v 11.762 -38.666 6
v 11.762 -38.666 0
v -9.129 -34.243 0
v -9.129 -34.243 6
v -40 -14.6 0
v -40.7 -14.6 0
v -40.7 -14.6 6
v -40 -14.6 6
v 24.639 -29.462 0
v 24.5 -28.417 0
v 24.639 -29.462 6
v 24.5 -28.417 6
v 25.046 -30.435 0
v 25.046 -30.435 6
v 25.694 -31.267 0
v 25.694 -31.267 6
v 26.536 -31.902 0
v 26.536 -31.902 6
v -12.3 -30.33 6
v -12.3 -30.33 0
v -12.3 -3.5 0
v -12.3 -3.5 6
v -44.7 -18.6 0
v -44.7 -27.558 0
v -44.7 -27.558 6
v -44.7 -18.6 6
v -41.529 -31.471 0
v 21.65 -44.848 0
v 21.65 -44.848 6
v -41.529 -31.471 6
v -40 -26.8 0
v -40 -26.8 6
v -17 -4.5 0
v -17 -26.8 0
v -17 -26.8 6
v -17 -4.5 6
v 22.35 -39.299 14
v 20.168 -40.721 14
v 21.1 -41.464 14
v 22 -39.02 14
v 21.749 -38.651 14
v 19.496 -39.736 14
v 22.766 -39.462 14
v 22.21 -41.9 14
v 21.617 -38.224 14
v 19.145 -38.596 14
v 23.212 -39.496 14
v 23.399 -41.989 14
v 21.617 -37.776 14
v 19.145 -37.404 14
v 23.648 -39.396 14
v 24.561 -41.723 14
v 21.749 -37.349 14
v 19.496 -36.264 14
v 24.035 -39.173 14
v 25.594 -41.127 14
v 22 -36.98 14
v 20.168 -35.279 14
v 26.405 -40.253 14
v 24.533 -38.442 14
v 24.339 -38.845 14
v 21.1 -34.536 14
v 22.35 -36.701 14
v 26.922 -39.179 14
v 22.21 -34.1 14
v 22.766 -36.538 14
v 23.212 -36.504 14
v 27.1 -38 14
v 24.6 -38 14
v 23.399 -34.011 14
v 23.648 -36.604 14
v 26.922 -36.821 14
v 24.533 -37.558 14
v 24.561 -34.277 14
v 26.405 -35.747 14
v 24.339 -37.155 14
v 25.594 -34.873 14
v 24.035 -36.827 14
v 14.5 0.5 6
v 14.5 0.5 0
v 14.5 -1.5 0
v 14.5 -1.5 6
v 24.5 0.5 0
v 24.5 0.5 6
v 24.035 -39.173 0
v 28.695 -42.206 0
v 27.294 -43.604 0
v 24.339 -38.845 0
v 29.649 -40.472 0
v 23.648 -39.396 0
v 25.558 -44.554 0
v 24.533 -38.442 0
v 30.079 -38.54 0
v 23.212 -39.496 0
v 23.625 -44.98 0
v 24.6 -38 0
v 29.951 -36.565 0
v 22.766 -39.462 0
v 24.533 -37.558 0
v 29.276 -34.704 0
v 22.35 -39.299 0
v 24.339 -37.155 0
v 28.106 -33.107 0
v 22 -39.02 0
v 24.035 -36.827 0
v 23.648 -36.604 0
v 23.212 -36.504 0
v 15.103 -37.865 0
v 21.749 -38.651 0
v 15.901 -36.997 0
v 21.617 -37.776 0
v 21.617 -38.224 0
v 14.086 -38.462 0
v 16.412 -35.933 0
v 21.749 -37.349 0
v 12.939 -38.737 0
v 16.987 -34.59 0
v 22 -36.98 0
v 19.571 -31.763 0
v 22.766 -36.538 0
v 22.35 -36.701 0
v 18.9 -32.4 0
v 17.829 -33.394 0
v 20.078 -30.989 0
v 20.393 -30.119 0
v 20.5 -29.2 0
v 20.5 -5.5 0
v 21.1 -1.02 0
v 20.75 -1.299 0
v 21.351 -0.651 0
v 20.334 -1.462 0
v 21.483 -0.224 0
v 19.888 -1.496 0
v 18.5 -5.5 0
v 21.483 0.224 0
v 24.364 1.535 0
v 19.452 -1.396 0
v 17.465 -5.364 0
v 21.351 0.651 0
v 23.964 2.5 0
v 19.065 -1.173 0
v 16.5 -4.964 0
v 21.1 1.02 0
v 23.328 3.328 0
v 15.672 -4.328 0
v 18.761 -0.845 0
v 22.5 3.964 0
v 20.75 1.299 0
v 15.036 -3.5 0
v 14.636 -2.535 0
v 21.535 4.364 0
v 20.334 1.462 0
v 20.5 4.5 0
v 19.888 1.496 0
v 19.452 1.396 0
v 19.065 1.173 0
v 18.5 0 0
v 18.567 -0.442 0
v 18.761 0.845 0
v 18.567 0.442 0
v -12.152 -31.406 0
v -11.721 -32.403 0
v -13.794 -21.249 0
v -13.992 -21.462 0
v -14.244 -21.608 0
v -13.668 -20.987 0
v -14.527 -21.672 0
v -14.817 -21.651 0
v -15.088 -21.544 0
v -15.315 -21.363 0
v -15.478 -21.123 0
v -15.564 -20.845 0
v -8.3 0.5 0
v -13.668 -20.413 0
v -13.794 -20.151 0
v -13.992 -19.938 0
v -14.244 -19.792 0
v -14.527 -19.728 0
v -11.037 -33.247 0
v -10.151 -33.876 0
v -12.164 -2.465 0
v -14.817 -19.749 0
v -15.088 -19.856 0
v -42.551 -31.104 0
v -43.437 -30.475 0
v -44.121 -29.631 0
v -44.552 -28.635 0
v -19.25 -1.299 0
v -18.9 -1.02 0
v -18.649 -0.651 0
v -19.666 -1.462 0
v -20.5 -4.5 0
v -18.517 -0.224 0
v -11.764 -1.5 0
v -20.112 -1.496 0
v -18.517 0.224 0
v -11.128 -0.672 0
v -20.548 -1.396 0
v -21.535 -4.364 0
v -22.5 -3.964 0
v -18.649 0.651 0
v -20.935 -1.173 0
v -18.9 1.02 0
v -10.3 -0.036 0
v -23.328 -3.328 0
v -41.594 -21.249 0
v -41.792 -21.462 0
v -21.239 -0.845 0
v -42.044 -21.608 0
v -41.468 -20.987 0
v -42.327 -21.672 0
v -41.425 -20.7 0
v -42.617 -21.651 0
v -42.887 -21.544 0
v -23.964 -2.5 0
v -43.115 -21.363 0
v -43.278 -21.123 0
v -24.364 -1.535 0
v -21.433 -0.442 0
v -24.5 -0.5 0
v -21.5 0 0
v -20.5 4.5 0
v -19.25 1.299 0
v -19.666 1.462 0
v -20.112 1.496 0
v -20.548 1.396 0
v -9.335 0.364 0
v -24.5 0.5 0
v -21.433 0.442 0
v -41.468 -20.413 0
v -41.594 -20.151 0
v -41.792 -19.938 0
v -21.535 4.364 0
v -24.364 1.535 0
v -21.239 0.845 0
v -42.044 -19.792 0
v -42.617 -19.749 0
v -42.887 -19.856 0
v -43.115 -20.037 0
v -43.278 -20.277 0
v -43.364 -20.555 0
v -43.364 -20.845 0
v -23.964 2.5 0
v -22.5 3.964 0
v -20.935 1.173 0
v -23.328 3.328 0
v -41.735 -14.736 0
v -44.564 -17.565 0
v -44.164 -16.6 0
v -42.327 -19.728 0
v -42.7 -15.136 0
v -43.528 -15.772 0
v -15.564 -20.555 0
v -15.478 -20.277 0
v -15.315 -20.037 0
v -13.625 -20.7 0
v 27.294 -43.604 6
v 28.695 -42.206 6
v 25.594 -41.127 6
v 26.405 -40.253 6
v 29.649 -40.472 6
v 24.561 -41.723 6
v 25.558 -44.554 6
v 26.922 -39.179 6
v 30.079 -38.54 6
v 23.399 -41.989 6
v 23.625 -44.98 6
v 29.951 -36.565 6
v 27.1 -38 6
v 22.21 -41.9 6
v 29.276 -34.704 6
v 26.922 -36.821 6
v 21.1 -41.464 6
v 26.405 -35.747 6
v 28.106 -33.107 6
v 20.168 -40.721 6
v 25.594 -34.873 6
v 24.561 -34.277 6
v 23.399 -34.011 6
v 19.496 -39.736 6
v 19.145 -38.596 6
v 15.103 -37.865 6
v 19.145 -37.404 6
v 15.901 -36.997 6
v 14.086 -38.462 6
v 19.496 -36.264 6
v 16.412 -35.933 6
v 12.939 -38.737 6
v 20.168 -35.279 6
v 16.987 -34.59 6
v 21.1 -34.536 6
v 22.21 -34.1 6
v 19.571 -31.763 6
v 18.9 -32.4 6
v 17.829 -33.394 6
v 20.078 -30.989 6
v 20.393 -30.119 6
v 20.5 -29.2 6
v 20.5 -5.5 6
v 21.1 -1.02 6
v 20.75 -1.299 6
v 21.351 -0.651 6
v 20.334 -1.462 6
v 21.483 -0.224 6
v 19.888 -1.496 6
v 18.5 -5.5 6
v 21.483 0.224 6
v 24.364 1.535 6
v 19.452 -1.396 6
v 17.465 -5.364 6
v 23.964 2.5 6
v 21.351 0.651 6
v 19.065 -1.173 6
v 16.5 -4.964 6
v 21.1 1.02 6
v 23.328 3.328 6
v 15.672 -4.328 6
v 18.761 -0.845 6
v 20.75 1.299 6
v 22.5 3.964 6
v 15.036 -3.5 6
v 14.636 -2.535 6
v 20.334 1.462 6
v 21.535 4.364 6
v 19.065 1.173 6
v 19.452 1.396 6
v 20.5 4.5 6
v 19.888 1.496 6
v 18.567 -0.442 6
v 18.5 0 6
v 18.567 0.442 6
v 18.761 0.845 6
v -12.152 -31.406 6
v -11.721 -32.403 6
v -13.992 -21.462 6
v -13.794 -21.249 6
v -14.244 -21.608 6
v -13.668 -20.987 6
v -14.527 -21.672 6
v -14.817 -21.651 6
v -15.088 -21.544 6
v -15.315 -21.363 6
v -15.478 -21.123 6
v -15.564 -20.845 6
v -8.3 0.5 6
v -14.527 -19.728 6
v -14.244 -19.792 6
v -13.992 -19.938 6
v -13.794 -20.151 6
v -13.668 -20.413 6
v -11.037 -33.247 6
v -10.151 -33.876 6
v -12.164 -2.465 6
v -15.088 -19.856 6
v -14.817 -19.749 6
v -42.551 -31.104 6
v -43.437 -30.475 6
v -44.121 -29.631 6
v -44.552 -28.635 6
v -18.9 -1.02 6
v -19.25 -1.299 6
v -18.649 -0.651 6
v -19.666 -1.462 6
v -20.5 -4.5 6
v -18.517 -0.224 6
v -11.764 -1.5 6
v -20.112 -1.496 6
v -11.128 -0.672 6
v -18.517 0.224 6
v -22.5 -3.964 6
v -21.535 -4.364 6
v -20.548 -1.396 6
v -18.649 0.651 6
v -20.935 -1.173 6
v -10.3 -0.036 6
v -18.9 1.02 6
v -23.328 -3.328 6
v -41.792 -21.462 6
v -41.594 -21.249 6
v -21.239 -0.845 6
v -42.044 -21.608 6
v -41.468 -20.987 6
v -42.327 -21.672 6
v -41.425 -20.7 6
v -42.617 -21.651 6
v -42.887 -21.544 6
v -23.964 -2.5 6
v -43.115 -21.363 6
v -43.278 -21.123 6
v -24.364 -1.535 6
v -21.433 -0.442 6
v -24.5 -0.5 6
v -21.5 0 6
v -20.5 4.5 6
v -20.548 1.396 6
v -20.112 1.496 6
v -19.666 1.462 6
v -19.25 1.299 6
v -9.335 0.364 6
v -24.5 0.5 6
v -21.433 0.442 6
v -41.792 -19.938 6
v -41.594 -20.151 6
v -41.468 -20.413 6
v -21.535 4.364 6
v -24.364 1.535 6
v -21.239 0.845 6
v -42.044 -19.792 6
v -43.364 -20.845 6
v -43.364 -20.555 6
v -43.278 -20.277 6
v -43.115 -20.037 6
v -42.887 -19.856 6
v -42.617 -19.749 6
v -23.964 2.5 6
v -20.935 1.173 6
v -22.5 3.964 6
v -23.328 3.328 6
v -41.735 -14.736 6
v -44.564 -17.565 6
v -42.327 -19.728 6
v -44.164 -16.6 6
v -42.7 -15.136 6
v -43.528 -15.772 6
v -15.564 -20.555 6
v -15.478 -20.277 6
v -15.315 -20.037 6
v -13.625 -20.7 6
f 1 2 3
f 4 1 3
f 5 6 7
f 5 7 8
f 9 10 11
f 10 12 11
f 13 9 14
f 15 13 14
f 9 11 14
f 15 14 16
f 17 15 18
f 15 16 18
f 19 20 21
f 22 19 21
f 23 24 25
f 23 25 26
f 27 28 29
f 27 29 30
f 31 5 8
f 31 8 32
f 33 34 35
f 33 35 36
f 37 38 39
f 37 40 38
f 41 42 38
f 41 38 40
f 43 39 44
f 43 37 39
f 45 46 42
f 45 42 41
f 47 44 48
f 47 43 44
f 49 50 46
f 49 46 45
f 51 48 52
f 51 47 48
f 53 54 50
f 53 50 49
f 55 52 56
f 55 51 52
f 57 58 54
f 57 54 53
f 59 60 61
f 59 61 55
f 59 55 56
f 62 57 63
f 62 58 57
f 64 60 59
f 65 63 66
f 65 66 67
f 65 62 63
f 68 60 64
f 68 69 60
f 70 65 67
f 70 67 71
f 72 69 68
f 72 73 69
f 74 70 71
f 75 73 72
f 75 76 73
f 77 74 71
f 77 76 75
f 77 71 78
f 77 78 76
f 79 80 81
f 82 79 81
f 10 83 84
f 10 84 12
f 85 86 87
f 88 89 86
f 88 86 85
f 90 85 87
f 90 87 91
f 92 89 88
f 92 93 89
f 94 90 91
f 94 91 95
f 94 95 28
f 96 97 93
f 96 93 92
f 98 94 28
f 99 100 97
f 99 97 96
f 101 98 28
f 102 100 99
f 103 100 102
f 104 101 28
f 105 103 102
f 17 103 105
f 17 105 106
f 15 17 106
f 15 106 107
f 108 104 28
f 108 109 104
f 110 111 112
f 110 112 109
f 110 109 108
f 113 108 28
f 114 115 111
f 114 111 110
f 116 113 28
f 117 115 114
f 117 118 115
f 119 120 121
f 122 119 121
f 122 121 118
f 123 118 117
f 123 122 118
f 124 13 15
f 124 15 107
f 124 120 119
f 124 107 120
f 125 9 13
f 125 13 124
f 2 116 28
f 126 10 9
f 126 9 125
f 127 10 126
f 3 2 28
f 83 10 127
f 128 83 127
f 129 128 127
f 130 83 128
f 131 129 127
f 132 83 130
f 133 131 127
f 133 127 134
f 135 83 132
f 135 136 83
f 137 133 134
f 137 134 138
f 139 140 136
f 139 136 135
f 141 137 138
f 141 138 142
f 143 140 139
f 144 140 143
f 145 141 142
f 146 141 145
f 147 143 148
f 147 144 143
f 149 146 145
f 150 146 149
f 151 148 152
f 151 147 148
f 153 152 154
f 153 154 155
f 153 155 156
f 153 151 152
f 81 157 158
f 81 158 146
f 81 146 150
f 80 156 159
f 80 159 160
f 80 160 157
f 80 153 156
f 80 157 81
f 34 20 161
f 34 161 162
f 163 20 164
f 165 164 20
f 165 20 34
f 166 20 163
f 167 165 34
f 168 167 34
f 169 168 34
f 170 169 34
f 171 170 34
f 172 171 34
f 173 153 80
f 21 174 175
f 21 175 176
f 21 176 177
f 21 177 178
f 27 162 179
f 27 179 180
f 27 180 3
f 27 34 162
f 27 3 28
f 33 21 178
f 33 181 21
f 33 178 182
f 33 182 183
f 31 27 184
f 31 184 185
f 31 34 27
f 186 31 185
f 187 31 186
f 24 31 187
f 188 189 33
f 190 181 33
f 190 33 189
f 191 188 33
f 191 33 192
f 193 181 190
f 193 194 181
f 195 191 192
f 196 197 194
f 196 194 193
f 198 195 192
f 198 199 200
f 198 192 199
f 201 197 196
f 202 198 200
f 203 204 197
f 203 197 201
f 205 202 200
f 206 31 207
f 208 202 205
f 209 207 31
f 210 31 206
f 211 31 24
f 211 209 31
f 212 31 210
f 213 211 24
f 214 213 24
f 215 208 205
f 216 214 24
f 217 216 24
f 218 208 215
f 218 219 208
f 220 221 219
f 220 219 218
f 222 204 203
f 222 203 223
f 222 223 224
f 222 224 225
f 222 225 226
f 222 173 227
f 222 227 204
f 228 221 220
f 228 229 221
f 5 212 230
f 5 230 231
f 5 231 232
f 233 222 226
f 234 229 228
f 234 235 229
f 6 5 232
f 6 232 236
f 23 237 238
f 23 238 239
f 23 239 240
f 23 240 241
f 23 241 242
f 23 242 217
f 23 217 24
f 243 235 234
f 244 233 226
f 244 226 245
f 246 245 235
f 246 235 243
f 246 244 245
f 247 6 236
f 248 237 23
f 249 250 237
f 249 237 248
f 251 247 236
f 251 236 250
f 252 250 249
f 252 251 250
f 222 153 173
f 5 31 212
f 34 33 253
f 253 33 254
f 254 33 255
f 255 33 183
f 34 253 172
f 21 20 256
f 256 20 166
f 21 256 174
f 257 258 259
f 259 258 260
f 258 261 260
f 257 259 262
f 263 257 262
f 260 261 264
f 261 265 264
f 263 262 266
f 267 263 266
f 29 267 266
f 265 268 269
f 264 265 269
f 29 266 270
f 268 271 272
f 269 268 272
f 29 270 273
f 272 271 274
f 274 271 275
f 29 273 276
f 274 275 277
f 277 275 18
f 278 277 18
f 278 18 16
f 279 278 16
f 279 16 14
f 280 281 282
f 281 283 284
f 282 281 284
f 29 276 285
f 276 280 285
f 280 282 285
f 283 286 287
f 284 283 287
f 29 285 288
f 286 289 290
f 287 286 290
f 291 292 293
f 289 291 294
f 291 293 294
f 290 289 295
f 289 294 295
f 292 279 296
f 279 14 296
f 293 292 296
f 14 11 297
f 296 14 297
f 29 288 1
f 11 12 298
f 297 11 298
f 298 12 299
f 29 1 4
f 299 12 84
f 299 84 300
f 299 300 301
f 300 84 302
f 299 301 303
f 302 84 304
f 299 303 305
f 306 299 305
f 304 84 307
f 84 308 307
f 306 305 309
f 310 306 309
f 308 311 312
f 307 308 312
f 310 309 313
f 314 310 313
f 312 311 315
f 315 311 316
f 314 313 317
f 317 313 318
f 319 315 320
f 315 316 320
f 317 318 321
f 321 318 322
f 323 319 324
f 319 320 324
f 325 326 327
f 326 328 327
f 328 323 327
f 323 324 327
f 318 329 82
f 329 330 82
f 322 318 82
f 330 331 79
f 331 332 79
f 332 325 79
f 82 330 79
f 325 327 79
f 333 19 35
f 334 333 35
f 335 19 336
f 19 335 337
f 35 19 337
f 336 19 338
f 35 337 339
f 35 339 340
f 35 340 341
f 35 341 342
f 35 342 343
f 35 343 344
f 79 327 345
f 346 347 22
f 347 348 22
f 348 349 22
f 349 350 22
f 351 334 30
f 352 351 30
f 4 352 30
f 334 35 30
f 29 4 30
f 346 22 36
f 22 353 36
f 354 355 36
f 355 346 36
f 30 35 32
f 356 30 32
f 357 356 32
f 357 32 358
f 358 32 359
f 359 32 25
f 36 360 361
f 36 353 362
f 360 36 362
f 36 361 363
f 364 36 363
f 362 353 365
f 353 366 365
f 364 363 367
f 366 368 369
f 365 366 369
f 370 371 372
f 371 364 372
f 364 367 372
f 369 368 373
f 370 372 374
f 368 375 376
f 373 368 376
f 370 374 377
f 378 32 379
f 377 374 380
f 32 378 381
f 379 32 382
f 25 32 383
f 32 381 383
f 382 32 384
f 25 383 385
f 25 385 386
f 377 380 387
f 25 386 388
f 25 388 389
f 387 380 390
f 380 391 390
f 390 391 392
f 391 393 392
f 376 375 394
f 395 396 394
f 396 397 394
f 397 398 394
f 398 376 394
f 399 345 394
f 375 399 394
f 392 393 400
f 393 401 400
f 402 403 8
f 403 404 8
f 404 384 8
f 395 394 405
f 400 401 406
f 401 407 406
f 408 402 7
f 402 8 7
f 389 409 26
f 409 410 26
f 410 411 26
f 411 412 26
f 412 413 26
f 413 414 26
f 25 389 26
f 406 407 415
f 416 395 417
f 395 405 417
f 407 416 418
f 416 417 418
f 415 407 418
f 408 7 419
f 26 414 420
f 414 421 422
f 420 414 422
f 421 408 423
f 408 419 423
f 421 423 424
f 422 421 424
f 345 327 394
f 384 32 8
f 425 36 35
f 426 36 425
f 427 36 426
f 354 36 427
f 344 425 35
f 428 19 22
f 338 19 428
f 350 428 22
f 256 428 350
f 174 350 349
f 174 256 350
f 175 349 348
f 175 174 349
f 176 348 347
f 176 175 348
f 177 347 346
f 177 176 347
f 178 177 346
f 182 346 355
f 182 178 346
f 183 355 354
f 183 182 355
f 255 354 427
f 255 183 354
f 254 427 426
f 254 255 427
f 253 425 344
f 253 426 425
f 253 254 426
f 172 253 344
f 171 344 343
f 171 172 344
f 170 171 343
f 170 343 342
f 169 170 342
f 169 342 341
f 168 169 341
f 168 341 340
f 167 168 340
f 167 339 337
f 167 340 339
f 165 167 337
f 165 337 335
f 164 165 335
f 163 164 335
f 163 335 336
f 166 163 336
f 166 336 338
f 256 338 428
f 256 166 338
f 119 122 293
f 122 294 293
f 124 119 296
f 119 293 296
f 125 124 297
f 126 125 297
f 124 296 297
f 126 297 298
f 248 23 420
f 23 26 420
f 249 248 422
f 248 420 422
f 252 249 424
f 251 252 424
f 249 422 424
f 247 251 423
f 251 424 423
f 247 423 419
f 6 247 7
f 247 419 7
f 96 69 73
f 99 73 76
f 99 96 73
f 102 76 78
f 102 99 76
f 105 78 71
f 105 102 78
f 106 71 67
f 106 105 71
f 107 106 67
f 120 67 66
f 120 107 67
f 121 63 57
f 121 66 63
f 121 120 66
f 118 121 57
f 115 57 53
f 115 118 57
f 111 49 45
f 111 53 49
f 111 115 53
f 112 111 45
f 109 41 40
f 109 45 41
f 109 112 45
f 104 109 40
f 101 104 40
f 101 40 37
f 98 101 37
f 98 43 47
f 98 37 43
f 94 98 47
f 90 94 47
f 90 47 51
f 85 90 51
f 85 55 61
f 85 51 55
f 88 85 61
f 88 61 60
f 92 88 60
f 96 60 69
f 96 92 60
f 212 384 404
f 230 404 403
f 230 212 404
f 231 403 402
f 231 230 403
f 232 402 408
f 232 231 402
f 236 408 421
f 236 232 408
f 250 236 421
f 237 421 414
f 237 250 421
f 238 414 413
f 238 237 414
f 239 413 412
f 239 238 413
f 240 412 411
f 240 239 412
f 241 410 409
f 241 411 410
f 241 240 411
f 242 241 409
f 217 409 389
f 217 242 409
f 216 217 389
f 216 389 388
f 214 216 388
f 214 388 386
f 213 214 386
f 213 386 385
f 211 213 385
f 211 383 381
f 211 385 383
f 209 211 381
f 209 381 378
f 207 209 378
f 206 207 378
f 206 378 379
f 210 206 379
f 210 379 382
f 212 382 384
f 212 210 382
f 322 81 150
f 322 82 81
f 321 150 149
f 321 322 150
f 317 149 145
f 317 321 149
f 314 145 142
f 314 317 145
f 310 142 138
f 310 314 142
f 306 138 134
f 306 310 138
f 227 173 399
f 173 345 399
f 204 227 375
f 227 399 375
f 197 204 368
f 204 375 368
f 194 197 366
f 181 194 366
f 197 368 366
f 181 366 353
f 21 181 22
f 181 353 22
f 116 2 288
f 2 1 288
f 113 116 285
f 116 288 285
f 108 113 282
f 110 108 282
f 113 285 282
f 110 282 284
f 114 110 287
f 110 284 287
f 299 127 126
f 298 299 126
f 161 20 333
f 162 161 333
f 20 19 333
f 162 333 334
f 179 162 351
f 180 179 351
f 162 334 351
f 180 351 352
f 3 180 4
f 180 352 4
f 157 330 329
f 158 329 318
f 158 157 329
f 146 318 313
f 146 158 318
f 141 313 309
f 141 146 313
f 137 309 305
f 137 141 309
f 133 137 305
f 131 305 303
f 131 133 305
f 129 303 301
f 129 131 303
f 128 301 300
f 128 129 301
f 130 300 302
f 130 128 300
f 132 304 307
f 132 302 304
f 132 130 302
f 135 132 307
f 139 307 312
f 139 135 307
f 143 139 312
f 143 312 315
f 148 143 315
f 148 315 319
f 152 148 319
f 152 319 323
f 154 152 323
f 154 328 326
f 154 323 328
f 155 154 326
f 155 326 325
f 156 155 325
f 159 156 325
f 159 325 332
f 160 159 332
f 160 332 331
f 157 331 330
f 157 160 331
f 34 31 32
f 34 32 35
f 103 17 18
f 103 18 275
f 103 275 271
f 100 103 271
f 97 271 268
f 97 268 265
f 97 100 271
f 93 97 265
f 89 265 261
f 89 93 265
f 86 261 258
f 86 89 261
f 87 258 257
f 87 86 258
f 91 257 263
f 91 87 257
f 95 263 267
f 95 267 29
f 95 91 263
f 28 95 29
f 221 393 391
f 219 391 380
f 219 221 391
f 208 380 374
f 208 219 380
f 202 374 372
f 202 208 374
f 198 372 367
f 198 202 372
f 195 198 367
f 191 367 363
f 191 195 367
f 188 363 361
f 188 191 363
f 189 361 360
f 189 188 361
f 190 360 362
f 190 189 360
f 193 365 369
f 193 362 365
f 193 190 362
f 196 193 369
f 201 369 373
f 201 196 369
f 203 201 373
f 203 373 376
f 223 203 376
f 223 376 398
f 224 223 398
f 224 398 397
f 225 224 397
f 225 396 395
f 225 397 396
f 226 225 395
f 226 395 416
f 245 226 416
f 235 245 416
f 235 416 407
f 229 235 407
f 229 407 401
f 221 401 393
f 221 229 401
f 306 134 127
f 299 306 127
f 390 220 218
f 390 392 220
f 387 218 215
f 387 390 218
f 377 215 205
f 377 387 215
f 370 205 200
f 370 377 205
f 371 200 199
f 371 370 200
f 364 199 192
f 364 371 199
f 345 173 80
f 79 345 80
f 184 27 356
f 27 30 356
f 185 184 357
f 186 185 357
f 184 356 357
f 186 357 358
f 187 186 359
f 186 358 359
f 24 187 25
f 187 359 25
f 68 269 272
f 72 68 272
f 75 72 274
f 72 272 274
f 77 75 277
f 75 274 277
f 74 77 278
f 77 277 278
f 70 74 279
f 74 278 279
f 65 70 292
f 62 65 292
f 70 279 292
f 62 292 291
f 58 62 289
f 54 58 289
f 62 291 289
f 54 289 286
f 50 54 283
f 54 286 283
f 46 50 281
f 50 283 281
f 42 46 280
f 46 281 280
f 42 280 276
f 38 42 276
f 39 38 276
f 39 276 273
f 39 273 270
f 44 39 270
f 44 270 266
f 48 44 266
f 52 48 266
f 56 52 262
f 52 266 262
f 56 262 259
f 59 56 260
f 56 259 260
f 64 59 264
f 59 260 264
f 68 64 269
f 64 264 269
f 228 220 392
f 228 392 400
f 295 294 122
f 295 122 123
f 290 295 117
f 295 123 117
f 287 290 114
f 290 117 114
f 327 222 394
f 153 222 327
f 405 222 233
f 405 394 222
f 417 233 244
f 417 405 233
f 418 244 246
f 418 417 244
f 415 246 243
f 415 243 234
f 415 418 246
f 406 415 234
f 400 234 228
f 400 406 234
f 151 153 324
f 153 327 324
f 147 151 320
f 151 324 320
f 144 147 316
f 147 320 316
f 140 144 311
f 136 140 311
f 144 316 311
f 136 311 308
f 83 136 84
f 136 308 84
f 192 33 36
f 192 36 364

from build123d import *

# Parameters (mm, degrees)
BOSS_EXTRUDE1_DEPTH      = 6
MOUNT_SCREW_HOLES_REACH  = 65.711
SKETCH12_R               = 1.5
GEAR_START               = 6
SKETCH13_R               = 4
GEAR_SHAFT_DEPTH         = 8
SKETCH14_R               = 1.5
GEAR_SCREW_HOLE_DEPTH    = 65.954522552
SKETCH15_R               = 0.975
SERVO_SCREW_CUTOUT_DEPTH = 65.954522552
FILLET1_R                = 4


with BuildPart() as part:
    # body → Boss-Extrude1 (new body)
    with BuildSketch(Plane.XY):
        with BuildLine():
            Line((-24.5, 4.5), (24.5, 4.5))
            Line((24.5, 4.5), (24.5, -31.14142872))
            ThreePointArc((24.5, -31.14142872), (29.953423421, -39.424986813), (21.650045301, -44.848184531))
            Line((21.650045301, -44.848184531), (-44.7, -30.8))
            Line((-44.7, -30.8), (-44.7, -14.6))
            Line((-44.7, -14.6), (-40, -14.6))
            Line((-40, -14.6), (-40, -26.8))
            Line((-40, -26.8), (-17, -26.8))
            Line((-17, -26.8), (-17, -4.5))
            Line((-17, -4.5), (-24.5, -4.5))
            Line((-24.5, -4.5), (-24.5, 4.5))
        make_face()
        with BuildLine():
            Line((-12.3, 0.5), (14.5, 0.5))
            Line((14.5, 0.5), (14.5, -5.5))
            Line((14.5, -5.5), (20.5, -5.5))
            Line((20.5, -5.5), (20.5, -31.500769276))
            ThreePointArc((20.5, -31.500769276), (16.884558972, -34.780016642), (16.291201999, -39.624890698))
            Line((16.291201999, -39.624890698), (-12.3, -33.571323141))
            Line((-12.3, -33.571323141), (-12.3, 0.5))
        make_face(mode=Mode.SUBTRACT)
    extrude(amount=BOSS_EXTRUDE1_DEPTH)

    # Sketch12 → mount screw holes (cut, up to next)
    with BuildSketch(Plane.XY, mode=Mode.PRIVATE) as mount_screw_holes_sk1:
        with Locations(Location((20, 0, 0), (0, 0, 180))):
            Circle(SKETCH12_R)
    mount_screw_holes_tool1 = extrude(mount_screw_holes_sk1.sketch, amount=MOUNT_SCREW_HOLES_REACH, mode=Mode.PRIVATE) & part.part
    # Sketch12 → mount screw holes (cut, up to next)
    with BuildSketch(Plane.XY, mode=Mode.PRIVATE) as mount_screw_holes_sk2:
        with Locations(Location((-20, 0, 0), (0, 0, 180))):
            Circle(SKETCH12_R)
    mount_screw_holes_tool2 = extrude(mount_screw_holes_sk2.sketch, amount=MOUNT_SCREW_HOLES_REACH, mode=Mode.PRIVATE) & part.part
    add(mount_screw_holes_tool1.solids().sort_by_distance((20, 0, 0))[0], mode=Mode.SUBTRACT)
    add(mount_screw_holes_tool2.solids().sort_by_distance((-20, 0, 0))[0], mode=Mode.SUBTRACT)

    # Sketch13 → gear shaft (add)
    with BuildSketch(Plane.XY.offset(GEAR_START)):
        with Locations((23.1, -38)):
            Circle(SKETCH13_R)
    extrude(amount=GEAR_SHAFT_DEPTH)

    # Sketch14 → gear screw hole (cut, through all)
    with BuildSketch(Plane.XY):
        with Locations((23.1, -38)):
            Circle(SKETCH14_R)
    extrude(amount=GEAR_SCREW_HOLE_DEPTH, mode=Mode.SUBTRACT)

    # Sketch15 → servo screw cutout (cut, through all)
    with BuildSketch(Plane.XY):
        with Locations((-14.6, -20.7)):
            Circle(SKETCH15_R)
        with Locations((-42.4, -20.7)):
            Circle(SKETCH15_R)
    extrude(amount=SERVO_SCREW_CUTOUT_DEPTH, mode=Mode.SUBTRACT)

    # Fillet1
    fillet1_edges = [part.edges().sort_by_distance(p)[0] for p in [
        (-24.5, -4.5, 3),
        (-24.5, 4.5, 3),
        (24.5, 4.5, 3),
        (24.5, -31.14142872, 3),
        (-44.7, -30.8, 3),
        (-44.7, -14.6, 3),
        (14.5, -5.5, 3),
        (-12.3, 0.5, 3),
        (-12.3, -33.571323141, 3),
        (16.291201999, -39.624890698, 3),
        (20.5, -31.500769276, 3),
    ]]
    fillet(fillet1_edges, radius=FILLET1_R)


solid = part.part
